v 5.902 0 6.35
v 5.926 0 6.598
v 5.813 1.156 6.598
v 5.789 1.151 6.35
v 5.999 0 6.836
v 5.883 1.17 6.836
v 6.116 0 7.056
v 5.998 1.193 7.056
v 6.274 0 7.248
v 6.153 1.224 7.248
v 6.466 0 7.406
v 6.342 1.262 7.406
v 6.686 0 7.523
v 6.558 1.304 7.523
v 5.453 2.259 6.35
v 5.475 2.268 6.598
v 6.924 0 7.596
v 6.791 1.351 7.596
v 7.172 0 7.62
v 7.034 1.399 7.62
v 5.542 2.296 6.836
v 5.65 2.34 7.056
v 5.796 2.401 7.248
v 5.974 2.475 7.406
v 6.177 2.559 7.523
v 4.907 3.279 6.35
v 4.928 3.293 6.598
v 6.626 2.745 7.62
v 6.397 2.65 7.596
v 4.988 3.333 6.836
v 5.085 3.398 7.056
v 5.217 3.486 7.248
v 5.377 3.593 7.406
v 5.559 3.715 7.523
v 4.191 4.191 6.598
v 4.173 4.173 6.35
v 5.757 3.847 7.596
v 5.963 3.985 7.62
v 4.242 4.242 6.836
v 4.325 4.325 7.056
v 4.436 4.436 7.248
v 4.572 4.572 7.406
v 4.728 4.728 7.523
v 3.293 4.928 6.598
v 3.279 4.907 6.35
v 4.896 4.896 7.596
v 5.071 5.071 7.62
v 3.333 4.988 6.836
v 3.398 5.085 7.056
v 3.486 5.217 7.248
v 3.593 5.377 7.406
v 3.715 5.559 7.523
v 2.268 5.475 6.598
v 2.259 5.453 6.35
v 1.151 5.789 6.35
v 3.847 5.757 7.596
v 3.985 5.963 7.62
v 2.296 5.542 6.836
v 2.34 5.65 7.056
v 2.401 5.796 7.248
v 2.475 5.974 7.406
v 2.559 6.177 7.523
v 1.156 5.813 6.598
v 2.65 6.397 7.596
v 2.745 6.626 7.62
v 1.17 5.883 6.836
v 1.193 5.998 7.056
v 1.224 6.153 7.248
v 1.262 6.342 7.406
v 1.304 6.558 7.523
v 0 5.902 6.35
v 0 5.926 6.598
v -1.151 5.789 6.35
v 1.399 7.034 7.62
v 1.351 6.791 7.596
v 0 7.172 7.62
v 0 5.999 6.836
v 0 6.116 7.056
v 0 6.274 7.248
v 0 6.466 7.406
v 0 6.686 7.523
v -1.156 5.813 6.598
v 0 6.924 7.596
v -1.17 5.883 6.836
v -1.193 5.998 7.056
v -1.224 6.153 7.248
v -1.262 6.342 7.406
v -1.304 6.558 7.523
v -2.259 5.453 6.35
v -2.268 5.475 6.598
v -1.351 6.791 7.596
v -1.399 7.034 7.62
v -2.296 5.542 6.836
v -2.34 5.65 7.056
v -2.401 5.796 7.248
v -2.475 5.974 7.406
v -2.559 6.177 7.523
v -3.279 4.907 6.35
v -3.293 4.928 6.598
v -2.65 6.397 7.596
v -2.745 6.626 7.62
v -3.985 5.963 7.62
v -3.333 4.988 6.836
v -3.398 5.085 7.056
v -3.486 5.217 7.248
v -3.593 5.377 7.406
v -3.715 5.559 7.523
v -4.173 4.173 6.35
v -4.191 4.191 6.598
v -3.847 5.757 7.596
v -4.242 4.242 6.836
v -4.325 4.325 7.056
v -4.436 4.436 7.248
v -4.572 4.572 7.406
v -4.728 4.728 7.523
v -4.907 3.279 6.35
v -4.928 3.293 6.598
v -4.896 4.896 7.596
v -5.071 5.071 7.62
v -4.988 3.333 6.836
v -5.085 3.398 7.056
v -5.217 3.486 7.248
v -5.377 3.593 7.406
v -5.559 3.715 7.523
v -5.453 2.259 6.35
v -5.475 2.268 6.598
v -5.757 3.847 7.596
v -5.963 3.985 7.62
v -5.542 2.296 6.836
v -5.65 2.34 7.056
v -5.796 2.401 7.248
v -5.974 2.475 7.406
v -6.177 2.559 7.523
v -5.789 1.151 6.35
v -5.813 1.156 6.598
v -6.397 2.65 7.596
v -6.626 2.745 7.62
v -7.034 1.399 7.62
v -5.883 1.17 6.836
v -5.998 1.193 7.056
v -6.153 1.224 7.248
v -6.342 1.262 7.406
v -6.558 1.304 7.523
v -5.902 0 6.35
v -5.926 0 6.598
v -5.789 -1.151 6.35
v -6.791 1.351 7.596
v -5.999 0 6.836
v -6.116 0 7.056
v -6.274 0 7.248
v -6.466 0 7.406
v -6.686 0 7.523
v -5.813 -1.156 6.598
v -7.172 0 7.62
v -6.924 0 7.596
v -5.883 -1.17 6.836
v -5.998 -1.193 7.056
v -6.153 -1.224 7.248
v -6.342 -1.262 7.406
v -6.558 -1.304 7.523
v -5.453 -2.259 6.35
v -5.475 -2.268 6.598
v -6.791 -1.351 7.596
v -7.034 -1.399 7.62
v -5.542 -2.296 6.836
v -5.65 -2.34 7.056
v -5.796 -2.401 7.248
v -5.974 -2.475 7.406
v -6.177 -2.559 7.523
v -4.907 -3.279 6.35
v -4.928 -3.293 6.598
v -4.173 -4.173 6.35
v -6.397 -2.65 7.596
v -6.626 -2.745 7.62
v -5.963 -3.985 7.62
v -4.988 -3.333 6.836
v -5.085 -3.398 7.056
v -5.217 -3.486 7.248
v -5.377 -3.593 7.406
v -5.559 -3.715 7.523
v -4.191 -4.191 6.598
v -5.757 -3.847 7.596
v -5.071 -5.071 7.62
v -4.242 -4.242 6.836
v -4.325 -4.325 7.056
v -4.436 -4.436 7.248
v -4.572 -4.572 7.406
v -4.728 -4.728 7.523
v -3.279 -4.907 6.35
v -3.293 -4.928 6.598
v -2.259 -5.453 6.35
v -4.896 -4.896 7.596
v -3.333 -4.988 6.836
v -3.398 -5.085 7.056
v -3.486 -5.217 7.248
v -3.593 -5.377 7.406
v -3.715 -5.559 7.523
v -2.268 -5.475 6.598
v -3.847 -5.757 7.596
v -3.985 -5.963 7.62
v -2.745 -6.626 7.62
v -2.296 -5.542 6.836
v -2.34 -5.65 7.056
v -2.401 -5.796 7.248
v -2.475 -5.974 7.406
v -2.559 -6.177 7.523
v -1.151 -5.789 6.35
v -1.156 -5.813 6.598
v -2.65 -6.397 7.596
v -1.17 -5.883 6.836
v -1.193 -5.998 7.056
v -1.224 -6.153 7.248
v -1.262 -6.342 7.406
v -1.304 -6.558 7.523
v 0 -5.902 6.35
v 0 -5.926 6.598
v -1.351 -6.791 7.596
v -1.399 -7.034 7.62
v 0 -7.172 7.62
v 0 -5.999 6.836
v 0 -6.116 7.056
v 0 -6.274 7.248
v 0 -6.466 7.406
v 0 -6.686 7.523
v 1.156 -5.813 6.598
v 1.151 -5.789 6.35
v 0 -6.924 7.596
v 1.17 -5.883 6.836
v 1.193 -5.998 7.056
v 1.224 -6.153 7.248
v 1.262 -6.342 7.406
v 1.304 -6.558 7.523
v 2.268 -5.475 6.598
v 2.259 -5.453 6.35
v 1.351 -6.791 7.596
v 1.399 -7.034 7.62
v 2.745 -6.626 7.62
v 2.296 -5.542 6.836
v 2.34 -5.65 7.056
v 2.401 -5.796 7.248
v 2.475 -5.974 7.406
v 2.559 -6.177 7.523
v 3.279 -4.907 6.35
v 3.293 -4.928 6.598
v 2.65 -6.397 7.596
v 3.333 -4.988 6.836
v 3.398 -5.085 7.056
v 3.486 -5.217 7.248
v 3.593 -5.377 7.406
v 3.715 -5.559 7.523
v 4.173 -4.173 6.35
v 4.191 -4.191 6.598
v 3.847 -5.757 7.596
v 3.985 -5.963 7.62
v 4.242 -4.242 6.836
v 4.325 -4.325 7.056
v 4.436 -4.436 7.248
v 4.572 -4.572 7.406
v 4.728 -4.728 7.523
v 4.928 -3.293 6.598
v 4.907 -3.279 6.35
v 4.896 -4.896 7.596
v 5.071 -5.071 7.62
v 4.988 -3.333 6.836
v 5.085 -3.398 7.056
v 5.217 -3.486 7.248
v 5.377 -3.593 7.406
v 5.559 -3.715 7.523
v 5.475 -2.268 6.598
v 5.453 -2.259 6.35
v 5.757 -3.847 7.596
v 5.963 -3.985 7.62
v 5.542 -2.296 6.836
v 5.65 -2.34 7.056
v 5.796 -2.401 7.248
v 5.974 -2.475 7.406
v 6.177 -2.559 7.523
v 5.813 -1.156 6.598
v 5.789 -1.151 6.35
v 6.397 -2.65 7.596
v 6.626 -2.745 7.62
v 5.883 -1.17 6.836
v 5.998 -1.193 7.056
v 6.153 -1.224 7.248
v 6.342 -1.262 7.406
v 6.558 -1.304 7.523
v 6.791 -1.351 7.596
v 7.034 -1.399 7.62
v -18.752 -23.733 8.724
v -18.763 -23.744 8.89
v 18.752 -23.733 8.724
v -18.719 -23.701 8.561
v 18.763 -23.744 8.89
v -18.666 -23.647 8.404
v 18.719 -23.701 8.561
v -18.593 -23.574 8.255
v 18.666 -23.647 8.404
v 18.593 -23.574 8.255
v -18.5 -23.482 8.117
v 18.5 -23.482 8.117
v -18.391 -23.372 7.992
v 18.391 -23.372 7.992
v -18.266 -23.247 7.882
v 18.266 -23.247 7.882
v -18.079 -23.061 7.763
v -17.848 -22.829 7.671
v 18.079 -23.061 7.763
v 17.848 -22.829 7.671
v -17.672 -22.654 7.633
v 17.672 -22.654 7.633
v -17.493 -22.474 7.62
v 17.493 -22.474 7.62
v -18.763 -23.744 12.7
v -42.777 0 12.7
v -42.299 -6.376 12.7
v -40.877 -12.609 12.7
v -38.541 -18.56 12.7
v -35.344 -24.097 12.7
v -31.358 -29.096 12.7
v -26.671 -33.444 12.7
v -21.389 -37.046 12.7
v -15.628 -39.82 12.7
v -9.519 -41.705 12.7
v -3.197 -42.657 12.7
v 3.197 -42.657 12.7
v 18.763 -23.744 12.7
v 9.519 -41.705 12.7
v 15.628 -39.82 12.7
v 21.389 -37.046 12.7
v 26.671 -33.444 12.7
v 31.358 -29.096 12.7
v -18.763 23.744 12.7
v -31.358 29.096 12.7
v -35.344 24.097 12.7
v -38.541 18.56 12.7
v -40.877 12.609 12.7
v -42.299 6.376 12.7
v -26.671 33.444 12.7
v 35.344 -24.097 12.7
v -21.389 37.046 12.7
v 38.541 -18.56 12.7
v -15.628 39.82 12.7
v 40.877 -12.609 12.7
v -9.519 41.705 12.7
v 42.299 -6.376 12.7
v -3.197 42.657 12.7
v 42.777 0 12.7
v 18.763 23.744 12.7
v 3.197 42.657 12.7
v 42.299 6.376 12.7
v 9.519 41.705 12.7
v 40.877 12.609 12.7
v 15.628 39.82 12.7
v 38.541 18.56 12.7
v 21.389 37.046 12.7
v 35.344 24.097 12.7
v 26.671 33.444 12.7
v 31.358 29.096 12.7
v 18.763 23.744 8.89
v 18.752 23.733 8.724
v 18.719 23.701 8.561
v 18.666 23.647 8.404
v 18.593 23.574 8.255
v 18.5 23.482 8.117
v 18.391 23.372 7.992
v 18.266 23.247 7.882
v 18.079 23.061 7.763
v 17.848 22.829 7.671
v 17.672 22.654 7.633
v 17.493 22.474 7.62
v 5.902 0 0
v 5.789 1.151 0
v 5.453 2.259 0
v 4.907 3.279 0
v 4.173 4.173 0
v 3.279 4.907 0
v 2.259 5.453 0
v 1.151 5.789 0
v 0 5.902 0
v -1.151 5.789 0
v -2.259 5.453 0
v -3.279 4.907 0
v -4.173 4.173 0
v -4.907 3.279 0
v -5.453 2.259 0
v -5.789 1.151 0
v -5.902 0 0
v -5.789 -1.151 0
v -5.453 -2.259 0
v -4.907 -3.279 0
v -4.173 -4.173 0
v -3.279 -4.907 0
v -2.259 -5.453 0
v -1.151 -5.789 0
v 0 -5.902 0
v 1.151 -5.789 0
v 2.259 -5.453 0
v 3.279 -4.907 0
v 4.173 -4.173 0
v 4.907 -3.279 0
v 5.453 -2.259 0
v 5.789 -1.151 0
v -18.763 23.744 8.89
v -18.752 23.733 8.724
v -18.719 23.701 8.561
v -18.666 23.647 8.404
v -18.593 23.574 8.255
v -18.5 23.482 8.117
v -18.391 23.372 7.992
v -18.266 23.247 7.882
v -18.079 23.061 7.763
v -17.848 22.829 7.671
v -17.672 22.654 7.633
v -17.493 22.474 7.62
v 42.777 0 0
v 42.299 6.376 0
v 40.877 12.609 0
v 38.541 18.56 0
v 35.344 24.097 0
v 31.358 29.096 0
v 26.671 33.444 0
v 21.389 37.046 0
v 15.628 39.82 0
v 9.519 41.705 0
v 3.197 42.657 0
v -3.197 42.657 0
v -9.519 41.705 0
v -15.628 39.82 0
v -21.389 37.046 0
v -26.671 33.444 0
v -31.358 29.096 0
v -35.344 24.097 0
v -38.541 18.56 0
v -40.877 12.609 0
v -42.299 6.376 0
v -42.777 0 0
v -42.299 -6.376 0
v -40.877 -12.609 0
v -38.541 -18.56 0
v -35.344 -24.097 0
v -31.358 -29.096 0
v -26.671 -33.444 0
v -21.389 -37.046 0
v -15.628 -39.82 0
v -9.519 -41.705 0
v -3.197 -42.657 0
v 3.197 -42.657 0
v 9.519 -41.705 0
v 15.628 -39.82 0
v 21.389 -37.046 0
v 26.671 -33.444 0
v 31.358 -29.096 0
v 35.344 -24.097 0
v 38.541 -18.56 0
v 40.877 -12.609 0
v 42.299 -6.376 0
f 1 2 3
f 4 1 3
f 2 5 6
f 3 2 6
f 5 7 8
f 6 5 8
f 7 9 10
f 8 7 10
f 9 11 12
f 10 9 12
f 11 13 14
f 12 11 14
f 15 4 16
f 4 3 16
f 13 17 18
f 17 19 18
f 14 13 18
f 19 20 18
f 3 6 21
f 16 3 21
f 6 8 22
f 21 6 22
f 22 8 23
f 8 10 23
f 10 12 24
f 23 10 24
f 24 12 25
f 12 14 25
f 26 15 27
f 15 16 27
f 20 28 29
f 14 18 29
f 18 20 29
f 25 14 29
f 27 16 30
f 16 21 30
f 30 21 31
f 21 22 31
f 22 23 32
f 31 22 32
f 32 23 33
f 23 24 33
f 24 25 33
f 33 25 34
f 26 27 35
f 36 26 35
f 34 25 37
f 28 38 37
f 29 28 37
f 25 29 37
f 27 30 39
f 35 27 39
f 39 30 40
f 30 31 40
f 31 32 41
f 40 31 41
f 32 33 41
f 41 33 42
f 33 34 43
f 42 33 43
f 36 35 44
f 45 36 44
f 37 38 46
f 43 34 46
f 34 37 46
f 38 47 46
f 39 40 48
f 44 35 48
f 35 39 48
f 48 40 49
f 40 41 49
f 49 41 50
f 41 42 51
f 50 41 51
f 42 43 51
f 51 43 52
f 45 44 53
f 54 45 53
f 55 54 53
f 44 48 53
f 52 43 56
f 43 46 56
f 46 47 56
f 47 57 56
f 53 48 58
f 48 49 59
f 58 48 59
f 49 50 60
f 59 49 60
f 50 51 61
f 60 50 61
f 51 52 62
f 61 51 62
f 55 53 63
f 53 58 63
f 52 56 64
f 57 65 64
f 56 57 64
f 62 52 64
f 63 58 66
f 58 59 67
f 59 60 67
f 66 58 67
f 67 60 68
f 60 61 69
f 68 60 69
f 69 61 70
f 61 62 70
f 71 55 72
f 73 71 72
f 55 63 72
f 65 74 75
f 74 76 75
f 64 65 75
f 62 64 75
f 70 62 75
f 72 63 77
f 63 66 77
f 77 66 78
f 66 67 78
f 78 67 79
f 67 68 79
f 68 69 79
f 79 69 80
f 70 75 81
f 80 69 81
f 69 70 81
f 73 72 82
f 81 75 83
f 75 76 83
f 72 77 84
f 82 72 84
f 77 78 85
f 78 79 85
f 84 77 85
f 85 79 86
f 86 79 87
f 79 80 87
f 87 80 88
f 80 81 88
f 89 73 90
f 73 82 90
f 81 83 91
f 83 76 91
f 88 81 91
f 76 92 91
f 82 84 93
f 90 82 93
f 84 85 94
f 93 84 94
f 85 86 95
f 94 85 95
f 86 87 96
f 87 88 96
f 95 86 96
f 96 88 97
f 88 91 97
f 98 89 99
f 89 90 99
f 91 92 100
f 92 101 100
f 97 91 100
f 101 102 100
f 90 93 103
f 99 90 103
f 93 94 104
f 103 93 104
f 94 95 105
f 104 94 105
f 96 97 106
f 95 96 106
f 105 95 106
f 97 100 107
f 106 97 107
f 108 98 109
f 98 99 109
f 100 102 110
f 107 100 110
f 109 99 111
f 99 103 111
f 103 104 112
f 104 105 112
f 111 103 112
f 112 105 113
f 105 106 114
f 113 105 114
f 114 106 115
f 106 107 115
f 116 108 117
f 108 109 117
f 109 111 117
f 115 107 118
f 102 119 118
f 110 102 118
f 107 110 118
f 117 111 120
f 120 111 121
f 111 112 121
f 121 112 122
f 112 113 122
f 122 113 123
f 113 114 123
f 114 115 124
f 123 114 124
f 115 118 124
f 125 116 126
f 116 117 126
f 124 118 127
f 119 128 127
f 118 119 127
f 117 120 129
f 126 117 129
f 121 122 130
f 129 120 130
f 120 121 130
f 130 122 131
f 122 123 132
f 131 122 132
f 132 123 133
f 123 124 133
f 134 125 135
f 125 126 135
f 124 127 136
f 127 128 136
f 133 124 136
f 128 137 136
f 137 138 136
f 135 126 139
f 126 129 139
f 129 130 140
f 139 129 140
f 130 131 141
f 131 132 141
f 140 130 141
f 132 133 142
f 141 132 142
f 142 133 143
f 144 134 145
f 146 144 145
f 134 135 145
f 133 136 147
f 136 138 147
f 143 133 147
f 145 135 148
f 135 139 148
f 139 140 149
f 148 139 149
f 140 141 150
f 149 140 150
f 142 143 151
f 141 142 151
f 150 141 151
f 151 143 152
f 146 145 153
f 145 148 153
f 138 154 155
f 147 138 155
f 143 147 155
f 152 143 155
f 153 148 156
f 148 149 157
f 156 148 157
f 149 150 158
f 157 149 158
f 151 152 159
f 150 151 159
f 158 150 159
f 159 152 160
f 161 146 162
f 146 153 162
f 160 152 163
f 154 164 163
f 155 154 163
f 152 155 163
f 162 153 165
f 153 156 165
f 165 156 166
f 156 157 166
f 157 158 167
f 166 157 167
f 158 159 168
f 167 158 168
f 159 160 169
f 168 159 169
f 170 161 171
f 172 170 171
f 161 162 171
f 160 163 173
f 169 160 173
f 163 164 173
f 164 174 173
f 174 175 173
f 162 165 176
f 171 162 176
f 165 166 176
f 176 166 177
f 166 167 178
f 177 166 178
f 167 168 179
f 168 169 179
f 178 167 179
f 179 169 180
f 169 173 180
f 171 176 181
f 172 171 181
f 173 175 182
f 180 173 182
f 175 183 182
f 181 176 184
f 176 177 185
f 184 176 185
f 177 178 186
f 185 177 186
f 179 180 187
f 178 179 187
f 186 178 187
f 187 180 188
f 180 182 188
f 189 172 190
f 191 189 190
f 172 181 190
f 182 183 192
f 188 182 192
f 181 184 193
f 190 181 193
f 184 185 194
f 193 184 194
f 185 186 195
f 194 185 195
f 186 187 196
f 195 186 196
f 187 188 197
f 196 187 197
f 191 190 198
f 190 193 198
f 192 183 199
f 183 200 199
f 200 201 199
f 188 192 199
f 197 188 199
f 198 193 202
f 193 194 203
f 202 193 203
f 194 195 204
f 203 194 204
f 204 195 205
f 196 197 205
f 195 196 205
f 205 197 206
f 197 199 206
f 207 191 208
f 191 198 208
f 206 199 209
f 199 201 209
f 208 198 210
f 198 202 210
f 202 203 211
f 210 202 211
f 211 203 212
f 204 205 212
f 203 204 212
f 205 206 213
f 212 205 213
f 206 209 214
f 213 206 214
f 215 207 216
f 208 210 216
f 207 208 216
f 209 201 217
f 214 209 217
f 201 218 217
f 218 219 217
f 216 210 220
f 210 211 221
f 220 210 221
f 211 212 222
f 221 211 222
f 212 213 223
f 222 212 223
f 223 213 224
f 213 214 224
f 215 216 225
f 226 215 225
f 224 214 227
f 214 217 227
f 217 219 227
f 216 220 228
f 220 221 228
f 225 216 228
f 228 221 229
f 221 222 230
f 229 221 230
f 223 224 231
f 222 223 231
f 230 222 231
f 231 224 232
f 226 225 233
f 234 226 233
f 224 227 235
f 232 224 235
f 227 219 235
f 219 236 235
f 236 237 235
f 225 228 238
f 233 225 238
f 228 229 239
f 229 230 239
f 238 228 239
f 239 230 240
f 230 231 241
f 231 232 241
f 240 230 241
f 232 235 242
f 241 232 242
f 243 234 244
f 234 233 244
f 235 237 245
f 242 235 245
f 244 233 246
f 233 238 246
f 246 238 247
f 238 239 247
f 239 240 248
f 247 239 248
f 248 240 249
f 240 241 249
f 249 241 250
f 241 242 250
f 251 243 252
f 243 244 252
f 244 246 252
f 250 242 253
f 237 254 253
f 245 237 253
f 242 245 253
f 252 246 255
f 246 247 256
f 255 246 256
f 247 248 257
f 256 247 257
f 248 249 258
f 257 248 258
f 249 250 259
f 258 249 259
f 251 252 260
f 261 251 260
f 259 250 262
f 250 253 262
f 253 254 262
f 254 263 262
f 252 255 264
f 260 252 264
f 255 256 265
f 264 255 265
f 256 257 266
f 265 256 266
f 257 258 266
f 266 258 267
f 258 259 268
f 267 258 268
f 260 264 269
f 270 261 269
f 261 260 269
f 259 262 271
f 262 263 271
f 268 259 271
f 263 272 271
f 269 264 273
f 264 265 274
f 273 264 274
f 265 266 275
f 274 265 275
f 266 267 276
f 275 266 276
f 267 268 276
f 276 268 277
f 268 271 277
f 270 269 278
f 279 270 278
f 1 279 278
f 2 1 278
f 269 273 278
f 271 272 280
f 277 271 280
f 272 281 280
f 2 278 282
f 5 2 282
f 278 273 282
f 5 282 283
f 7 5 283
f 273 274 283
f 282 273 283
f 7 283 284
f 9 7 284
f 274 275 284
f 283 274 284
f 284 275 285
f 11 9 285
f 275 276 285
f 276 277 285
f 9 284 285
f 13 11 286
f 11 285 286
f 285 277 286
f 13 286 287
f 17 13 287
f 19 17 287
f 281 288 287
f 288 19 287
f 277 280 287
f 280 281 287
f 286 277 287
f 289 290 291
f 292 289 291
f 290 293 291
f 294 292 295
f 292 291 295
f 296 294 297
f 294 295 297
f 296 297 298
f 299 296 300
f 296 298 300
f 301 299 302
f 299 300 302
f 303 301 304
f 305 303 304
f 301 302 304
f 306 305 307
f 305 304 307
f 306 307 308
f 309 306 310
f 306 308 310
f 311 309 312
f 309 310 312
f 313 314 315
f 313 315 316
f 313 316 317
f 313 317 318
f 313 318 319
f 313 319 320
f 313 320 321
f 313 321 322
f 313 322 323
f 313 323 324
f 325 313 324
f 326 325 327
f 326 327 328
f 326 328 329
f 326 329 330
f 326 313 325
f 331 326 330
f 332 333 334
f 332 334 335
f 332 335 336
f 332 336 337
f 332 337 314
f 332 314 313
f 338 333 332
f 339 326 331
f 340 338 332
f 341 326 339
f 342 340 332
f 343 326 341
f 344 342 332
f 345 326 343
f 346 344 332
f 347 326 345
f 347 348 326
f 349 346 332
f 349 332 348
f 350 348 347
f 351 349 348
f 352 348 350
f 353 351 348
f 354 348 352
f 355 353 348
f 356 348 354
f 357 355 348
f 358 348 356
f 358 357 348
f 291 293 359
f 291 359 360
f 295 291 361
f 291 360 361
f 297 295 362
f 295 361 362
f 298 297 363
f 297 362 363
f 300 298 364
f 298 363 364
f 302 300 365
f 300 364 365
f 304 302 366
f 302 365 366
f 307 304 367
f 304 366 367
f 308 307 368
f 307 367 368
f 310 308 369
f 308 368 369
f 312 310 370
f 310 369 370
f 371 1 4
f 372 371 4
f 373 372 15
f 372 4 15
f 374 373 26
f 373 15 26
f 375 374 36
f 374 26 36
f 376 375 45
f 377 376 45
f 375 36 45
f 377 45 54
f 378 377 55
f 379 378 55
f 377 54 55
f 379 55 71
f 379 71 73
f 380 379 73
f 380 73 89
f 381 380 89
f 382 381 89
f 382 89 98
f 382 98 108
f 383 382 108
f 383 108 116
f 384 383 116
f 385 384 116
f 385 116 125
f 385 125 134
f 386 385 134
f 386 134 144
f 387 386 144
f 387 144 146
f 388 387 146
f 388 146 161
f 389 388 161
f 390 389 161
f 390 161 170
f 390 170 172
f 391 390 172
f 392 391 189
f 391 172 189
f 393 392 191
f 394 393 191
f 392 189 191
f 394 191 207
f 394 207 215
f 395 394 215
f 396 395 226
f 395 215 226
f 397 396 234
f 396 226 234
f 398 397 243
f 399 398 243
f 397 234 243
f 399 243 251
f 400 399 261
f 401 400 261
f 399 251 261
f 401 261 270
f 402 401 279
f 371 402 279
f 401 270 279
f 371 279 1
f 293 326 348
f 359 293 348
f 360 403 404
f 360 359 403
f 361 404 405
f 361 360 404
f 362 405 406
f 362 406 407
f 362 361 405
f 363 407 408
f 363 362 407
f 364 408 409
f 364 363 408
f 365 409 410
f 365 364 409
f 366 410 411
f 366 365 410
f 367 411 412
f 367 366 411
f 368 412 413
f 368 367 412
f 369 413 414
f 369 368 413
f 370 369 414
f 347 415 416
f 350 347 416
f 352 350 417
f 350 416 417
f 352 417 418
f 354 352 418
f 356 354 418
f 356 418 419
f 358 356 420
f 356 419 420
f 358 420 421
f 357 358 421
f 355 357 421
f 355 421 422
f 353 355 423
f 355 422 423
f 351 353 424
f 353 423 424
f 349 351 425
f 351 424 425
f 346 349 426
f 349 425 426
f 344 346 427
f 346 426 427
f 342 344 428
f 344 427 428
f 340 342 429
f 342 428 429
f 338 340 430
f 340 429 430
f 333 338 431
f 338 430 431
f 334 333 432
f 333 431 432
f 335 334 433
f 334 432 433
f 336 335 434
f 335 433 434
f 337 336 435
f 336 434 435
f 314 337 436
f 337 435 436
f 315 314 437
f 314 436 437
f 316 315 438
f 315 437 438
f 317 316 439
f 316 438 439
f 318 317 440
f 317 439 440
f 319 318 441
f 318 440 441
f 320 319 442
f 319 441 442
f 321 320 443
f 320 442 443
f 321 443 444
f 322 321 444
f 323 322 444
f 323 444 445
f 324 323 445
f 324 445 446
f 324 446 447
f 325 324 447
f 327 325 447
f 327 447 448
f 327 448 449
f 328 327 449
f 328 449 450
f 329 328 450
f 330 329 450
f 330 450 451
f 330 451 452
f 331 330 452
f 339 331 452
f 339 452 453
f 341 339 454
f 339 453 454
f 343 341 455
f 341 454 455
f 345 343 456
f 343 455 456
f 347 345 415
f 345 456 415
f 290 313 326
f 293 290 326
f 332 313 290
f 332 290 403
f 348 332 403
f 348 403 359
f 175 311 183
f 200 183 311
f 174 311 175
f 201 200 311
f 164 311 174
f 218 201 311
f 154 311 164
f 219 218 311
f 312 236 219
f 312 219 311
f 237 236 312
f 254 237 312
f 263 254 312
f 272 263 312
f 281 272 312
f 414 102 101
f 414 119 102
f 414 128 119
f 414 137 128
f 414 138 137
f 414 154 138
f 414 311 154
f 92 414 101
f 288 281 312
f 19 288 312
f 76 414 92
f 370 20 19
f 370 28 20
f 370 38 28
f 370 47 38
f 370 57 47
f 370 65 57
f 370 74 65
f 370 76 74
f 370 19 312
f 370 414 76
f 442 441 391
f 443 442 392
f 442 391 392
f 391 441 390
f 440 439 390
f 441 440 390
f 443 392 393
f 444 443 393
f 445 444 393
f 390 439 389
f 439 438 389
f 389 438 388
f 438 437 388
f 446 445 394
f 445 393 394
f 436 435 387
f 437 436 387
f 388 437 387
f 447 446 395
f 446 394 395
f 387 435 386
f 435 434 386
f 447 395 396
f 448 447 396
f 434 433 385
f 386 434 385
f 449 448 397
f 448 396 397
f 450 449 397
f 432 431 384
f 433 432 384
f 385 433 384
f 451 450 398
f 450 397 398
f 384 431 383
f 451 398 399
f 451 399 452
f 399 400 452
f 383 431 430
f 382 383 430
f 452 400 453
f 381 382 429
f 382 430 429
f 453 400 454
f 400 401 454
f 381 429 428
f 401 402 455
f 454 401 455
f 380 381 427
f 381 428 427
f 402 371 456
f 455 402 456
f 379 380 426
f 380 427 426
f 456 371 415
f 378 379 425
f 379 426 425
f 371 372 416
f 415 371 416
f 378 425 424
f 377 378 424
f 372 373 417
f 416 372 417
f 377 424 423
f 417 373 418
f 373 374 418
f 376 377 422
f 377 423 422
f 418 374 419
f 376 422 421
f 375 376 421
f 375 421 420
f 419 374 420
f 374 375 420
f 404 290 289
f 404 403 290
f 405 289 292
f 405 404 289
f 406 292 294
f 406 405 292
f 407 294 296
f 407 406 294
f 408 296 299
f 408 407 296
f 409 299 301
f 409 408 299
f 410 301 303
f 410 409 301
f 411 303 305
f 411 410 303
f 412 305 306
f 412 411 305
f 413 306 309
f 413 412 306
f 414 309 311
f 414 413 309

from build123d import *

# Parameters (mm, degrees)
F0_R     = 42.7770323115
F1_DEPTH = 12.7
F2_W     = 37.5254675746
F2_H     = 47.488167882
F3_DEPTH = 5.08
F4_R     = 5.9019782965
F5_DEPTH = 25.4
F6_R     = 1.27


with BuildPart() as f1:
    # F0 (on Top) → F1 (new body)
    with BuildSketch(Plane.XY):
        Circle(F0_R)
    extrude(amount=F1_DEPTH)

    # F2 (on face) → F3 (cut)
    with BuildSketch(Plane.XY.offset(12.7)):
        Rectangle(F2_W, F2_H)
    extrude(amount=-F3_DEPTH, mode=Mode.SUBTRACT)

    # F4 (on face) → F5 (cut)
    with BuildSketch(Plane.XY.offset(7.62)):
        Circle(F4_R)
    extrude(amount=-F5_DEPTH, mode=Mode.SUBTRACT)

    # F6
    f6_edges = [f1.edges().sort_by_distance(p)[0] for p in [
        (0, 23.744084, 7.62),
        (18.762734, 0, 7.62),
        (0, -23.744084, 7.62),
        (-18.762734, 0, 7.62),
        (-5.901978, 0, 7.62),
    ]]
    fillet(f6_edges, radius=F6_R)


solid = f1.part
